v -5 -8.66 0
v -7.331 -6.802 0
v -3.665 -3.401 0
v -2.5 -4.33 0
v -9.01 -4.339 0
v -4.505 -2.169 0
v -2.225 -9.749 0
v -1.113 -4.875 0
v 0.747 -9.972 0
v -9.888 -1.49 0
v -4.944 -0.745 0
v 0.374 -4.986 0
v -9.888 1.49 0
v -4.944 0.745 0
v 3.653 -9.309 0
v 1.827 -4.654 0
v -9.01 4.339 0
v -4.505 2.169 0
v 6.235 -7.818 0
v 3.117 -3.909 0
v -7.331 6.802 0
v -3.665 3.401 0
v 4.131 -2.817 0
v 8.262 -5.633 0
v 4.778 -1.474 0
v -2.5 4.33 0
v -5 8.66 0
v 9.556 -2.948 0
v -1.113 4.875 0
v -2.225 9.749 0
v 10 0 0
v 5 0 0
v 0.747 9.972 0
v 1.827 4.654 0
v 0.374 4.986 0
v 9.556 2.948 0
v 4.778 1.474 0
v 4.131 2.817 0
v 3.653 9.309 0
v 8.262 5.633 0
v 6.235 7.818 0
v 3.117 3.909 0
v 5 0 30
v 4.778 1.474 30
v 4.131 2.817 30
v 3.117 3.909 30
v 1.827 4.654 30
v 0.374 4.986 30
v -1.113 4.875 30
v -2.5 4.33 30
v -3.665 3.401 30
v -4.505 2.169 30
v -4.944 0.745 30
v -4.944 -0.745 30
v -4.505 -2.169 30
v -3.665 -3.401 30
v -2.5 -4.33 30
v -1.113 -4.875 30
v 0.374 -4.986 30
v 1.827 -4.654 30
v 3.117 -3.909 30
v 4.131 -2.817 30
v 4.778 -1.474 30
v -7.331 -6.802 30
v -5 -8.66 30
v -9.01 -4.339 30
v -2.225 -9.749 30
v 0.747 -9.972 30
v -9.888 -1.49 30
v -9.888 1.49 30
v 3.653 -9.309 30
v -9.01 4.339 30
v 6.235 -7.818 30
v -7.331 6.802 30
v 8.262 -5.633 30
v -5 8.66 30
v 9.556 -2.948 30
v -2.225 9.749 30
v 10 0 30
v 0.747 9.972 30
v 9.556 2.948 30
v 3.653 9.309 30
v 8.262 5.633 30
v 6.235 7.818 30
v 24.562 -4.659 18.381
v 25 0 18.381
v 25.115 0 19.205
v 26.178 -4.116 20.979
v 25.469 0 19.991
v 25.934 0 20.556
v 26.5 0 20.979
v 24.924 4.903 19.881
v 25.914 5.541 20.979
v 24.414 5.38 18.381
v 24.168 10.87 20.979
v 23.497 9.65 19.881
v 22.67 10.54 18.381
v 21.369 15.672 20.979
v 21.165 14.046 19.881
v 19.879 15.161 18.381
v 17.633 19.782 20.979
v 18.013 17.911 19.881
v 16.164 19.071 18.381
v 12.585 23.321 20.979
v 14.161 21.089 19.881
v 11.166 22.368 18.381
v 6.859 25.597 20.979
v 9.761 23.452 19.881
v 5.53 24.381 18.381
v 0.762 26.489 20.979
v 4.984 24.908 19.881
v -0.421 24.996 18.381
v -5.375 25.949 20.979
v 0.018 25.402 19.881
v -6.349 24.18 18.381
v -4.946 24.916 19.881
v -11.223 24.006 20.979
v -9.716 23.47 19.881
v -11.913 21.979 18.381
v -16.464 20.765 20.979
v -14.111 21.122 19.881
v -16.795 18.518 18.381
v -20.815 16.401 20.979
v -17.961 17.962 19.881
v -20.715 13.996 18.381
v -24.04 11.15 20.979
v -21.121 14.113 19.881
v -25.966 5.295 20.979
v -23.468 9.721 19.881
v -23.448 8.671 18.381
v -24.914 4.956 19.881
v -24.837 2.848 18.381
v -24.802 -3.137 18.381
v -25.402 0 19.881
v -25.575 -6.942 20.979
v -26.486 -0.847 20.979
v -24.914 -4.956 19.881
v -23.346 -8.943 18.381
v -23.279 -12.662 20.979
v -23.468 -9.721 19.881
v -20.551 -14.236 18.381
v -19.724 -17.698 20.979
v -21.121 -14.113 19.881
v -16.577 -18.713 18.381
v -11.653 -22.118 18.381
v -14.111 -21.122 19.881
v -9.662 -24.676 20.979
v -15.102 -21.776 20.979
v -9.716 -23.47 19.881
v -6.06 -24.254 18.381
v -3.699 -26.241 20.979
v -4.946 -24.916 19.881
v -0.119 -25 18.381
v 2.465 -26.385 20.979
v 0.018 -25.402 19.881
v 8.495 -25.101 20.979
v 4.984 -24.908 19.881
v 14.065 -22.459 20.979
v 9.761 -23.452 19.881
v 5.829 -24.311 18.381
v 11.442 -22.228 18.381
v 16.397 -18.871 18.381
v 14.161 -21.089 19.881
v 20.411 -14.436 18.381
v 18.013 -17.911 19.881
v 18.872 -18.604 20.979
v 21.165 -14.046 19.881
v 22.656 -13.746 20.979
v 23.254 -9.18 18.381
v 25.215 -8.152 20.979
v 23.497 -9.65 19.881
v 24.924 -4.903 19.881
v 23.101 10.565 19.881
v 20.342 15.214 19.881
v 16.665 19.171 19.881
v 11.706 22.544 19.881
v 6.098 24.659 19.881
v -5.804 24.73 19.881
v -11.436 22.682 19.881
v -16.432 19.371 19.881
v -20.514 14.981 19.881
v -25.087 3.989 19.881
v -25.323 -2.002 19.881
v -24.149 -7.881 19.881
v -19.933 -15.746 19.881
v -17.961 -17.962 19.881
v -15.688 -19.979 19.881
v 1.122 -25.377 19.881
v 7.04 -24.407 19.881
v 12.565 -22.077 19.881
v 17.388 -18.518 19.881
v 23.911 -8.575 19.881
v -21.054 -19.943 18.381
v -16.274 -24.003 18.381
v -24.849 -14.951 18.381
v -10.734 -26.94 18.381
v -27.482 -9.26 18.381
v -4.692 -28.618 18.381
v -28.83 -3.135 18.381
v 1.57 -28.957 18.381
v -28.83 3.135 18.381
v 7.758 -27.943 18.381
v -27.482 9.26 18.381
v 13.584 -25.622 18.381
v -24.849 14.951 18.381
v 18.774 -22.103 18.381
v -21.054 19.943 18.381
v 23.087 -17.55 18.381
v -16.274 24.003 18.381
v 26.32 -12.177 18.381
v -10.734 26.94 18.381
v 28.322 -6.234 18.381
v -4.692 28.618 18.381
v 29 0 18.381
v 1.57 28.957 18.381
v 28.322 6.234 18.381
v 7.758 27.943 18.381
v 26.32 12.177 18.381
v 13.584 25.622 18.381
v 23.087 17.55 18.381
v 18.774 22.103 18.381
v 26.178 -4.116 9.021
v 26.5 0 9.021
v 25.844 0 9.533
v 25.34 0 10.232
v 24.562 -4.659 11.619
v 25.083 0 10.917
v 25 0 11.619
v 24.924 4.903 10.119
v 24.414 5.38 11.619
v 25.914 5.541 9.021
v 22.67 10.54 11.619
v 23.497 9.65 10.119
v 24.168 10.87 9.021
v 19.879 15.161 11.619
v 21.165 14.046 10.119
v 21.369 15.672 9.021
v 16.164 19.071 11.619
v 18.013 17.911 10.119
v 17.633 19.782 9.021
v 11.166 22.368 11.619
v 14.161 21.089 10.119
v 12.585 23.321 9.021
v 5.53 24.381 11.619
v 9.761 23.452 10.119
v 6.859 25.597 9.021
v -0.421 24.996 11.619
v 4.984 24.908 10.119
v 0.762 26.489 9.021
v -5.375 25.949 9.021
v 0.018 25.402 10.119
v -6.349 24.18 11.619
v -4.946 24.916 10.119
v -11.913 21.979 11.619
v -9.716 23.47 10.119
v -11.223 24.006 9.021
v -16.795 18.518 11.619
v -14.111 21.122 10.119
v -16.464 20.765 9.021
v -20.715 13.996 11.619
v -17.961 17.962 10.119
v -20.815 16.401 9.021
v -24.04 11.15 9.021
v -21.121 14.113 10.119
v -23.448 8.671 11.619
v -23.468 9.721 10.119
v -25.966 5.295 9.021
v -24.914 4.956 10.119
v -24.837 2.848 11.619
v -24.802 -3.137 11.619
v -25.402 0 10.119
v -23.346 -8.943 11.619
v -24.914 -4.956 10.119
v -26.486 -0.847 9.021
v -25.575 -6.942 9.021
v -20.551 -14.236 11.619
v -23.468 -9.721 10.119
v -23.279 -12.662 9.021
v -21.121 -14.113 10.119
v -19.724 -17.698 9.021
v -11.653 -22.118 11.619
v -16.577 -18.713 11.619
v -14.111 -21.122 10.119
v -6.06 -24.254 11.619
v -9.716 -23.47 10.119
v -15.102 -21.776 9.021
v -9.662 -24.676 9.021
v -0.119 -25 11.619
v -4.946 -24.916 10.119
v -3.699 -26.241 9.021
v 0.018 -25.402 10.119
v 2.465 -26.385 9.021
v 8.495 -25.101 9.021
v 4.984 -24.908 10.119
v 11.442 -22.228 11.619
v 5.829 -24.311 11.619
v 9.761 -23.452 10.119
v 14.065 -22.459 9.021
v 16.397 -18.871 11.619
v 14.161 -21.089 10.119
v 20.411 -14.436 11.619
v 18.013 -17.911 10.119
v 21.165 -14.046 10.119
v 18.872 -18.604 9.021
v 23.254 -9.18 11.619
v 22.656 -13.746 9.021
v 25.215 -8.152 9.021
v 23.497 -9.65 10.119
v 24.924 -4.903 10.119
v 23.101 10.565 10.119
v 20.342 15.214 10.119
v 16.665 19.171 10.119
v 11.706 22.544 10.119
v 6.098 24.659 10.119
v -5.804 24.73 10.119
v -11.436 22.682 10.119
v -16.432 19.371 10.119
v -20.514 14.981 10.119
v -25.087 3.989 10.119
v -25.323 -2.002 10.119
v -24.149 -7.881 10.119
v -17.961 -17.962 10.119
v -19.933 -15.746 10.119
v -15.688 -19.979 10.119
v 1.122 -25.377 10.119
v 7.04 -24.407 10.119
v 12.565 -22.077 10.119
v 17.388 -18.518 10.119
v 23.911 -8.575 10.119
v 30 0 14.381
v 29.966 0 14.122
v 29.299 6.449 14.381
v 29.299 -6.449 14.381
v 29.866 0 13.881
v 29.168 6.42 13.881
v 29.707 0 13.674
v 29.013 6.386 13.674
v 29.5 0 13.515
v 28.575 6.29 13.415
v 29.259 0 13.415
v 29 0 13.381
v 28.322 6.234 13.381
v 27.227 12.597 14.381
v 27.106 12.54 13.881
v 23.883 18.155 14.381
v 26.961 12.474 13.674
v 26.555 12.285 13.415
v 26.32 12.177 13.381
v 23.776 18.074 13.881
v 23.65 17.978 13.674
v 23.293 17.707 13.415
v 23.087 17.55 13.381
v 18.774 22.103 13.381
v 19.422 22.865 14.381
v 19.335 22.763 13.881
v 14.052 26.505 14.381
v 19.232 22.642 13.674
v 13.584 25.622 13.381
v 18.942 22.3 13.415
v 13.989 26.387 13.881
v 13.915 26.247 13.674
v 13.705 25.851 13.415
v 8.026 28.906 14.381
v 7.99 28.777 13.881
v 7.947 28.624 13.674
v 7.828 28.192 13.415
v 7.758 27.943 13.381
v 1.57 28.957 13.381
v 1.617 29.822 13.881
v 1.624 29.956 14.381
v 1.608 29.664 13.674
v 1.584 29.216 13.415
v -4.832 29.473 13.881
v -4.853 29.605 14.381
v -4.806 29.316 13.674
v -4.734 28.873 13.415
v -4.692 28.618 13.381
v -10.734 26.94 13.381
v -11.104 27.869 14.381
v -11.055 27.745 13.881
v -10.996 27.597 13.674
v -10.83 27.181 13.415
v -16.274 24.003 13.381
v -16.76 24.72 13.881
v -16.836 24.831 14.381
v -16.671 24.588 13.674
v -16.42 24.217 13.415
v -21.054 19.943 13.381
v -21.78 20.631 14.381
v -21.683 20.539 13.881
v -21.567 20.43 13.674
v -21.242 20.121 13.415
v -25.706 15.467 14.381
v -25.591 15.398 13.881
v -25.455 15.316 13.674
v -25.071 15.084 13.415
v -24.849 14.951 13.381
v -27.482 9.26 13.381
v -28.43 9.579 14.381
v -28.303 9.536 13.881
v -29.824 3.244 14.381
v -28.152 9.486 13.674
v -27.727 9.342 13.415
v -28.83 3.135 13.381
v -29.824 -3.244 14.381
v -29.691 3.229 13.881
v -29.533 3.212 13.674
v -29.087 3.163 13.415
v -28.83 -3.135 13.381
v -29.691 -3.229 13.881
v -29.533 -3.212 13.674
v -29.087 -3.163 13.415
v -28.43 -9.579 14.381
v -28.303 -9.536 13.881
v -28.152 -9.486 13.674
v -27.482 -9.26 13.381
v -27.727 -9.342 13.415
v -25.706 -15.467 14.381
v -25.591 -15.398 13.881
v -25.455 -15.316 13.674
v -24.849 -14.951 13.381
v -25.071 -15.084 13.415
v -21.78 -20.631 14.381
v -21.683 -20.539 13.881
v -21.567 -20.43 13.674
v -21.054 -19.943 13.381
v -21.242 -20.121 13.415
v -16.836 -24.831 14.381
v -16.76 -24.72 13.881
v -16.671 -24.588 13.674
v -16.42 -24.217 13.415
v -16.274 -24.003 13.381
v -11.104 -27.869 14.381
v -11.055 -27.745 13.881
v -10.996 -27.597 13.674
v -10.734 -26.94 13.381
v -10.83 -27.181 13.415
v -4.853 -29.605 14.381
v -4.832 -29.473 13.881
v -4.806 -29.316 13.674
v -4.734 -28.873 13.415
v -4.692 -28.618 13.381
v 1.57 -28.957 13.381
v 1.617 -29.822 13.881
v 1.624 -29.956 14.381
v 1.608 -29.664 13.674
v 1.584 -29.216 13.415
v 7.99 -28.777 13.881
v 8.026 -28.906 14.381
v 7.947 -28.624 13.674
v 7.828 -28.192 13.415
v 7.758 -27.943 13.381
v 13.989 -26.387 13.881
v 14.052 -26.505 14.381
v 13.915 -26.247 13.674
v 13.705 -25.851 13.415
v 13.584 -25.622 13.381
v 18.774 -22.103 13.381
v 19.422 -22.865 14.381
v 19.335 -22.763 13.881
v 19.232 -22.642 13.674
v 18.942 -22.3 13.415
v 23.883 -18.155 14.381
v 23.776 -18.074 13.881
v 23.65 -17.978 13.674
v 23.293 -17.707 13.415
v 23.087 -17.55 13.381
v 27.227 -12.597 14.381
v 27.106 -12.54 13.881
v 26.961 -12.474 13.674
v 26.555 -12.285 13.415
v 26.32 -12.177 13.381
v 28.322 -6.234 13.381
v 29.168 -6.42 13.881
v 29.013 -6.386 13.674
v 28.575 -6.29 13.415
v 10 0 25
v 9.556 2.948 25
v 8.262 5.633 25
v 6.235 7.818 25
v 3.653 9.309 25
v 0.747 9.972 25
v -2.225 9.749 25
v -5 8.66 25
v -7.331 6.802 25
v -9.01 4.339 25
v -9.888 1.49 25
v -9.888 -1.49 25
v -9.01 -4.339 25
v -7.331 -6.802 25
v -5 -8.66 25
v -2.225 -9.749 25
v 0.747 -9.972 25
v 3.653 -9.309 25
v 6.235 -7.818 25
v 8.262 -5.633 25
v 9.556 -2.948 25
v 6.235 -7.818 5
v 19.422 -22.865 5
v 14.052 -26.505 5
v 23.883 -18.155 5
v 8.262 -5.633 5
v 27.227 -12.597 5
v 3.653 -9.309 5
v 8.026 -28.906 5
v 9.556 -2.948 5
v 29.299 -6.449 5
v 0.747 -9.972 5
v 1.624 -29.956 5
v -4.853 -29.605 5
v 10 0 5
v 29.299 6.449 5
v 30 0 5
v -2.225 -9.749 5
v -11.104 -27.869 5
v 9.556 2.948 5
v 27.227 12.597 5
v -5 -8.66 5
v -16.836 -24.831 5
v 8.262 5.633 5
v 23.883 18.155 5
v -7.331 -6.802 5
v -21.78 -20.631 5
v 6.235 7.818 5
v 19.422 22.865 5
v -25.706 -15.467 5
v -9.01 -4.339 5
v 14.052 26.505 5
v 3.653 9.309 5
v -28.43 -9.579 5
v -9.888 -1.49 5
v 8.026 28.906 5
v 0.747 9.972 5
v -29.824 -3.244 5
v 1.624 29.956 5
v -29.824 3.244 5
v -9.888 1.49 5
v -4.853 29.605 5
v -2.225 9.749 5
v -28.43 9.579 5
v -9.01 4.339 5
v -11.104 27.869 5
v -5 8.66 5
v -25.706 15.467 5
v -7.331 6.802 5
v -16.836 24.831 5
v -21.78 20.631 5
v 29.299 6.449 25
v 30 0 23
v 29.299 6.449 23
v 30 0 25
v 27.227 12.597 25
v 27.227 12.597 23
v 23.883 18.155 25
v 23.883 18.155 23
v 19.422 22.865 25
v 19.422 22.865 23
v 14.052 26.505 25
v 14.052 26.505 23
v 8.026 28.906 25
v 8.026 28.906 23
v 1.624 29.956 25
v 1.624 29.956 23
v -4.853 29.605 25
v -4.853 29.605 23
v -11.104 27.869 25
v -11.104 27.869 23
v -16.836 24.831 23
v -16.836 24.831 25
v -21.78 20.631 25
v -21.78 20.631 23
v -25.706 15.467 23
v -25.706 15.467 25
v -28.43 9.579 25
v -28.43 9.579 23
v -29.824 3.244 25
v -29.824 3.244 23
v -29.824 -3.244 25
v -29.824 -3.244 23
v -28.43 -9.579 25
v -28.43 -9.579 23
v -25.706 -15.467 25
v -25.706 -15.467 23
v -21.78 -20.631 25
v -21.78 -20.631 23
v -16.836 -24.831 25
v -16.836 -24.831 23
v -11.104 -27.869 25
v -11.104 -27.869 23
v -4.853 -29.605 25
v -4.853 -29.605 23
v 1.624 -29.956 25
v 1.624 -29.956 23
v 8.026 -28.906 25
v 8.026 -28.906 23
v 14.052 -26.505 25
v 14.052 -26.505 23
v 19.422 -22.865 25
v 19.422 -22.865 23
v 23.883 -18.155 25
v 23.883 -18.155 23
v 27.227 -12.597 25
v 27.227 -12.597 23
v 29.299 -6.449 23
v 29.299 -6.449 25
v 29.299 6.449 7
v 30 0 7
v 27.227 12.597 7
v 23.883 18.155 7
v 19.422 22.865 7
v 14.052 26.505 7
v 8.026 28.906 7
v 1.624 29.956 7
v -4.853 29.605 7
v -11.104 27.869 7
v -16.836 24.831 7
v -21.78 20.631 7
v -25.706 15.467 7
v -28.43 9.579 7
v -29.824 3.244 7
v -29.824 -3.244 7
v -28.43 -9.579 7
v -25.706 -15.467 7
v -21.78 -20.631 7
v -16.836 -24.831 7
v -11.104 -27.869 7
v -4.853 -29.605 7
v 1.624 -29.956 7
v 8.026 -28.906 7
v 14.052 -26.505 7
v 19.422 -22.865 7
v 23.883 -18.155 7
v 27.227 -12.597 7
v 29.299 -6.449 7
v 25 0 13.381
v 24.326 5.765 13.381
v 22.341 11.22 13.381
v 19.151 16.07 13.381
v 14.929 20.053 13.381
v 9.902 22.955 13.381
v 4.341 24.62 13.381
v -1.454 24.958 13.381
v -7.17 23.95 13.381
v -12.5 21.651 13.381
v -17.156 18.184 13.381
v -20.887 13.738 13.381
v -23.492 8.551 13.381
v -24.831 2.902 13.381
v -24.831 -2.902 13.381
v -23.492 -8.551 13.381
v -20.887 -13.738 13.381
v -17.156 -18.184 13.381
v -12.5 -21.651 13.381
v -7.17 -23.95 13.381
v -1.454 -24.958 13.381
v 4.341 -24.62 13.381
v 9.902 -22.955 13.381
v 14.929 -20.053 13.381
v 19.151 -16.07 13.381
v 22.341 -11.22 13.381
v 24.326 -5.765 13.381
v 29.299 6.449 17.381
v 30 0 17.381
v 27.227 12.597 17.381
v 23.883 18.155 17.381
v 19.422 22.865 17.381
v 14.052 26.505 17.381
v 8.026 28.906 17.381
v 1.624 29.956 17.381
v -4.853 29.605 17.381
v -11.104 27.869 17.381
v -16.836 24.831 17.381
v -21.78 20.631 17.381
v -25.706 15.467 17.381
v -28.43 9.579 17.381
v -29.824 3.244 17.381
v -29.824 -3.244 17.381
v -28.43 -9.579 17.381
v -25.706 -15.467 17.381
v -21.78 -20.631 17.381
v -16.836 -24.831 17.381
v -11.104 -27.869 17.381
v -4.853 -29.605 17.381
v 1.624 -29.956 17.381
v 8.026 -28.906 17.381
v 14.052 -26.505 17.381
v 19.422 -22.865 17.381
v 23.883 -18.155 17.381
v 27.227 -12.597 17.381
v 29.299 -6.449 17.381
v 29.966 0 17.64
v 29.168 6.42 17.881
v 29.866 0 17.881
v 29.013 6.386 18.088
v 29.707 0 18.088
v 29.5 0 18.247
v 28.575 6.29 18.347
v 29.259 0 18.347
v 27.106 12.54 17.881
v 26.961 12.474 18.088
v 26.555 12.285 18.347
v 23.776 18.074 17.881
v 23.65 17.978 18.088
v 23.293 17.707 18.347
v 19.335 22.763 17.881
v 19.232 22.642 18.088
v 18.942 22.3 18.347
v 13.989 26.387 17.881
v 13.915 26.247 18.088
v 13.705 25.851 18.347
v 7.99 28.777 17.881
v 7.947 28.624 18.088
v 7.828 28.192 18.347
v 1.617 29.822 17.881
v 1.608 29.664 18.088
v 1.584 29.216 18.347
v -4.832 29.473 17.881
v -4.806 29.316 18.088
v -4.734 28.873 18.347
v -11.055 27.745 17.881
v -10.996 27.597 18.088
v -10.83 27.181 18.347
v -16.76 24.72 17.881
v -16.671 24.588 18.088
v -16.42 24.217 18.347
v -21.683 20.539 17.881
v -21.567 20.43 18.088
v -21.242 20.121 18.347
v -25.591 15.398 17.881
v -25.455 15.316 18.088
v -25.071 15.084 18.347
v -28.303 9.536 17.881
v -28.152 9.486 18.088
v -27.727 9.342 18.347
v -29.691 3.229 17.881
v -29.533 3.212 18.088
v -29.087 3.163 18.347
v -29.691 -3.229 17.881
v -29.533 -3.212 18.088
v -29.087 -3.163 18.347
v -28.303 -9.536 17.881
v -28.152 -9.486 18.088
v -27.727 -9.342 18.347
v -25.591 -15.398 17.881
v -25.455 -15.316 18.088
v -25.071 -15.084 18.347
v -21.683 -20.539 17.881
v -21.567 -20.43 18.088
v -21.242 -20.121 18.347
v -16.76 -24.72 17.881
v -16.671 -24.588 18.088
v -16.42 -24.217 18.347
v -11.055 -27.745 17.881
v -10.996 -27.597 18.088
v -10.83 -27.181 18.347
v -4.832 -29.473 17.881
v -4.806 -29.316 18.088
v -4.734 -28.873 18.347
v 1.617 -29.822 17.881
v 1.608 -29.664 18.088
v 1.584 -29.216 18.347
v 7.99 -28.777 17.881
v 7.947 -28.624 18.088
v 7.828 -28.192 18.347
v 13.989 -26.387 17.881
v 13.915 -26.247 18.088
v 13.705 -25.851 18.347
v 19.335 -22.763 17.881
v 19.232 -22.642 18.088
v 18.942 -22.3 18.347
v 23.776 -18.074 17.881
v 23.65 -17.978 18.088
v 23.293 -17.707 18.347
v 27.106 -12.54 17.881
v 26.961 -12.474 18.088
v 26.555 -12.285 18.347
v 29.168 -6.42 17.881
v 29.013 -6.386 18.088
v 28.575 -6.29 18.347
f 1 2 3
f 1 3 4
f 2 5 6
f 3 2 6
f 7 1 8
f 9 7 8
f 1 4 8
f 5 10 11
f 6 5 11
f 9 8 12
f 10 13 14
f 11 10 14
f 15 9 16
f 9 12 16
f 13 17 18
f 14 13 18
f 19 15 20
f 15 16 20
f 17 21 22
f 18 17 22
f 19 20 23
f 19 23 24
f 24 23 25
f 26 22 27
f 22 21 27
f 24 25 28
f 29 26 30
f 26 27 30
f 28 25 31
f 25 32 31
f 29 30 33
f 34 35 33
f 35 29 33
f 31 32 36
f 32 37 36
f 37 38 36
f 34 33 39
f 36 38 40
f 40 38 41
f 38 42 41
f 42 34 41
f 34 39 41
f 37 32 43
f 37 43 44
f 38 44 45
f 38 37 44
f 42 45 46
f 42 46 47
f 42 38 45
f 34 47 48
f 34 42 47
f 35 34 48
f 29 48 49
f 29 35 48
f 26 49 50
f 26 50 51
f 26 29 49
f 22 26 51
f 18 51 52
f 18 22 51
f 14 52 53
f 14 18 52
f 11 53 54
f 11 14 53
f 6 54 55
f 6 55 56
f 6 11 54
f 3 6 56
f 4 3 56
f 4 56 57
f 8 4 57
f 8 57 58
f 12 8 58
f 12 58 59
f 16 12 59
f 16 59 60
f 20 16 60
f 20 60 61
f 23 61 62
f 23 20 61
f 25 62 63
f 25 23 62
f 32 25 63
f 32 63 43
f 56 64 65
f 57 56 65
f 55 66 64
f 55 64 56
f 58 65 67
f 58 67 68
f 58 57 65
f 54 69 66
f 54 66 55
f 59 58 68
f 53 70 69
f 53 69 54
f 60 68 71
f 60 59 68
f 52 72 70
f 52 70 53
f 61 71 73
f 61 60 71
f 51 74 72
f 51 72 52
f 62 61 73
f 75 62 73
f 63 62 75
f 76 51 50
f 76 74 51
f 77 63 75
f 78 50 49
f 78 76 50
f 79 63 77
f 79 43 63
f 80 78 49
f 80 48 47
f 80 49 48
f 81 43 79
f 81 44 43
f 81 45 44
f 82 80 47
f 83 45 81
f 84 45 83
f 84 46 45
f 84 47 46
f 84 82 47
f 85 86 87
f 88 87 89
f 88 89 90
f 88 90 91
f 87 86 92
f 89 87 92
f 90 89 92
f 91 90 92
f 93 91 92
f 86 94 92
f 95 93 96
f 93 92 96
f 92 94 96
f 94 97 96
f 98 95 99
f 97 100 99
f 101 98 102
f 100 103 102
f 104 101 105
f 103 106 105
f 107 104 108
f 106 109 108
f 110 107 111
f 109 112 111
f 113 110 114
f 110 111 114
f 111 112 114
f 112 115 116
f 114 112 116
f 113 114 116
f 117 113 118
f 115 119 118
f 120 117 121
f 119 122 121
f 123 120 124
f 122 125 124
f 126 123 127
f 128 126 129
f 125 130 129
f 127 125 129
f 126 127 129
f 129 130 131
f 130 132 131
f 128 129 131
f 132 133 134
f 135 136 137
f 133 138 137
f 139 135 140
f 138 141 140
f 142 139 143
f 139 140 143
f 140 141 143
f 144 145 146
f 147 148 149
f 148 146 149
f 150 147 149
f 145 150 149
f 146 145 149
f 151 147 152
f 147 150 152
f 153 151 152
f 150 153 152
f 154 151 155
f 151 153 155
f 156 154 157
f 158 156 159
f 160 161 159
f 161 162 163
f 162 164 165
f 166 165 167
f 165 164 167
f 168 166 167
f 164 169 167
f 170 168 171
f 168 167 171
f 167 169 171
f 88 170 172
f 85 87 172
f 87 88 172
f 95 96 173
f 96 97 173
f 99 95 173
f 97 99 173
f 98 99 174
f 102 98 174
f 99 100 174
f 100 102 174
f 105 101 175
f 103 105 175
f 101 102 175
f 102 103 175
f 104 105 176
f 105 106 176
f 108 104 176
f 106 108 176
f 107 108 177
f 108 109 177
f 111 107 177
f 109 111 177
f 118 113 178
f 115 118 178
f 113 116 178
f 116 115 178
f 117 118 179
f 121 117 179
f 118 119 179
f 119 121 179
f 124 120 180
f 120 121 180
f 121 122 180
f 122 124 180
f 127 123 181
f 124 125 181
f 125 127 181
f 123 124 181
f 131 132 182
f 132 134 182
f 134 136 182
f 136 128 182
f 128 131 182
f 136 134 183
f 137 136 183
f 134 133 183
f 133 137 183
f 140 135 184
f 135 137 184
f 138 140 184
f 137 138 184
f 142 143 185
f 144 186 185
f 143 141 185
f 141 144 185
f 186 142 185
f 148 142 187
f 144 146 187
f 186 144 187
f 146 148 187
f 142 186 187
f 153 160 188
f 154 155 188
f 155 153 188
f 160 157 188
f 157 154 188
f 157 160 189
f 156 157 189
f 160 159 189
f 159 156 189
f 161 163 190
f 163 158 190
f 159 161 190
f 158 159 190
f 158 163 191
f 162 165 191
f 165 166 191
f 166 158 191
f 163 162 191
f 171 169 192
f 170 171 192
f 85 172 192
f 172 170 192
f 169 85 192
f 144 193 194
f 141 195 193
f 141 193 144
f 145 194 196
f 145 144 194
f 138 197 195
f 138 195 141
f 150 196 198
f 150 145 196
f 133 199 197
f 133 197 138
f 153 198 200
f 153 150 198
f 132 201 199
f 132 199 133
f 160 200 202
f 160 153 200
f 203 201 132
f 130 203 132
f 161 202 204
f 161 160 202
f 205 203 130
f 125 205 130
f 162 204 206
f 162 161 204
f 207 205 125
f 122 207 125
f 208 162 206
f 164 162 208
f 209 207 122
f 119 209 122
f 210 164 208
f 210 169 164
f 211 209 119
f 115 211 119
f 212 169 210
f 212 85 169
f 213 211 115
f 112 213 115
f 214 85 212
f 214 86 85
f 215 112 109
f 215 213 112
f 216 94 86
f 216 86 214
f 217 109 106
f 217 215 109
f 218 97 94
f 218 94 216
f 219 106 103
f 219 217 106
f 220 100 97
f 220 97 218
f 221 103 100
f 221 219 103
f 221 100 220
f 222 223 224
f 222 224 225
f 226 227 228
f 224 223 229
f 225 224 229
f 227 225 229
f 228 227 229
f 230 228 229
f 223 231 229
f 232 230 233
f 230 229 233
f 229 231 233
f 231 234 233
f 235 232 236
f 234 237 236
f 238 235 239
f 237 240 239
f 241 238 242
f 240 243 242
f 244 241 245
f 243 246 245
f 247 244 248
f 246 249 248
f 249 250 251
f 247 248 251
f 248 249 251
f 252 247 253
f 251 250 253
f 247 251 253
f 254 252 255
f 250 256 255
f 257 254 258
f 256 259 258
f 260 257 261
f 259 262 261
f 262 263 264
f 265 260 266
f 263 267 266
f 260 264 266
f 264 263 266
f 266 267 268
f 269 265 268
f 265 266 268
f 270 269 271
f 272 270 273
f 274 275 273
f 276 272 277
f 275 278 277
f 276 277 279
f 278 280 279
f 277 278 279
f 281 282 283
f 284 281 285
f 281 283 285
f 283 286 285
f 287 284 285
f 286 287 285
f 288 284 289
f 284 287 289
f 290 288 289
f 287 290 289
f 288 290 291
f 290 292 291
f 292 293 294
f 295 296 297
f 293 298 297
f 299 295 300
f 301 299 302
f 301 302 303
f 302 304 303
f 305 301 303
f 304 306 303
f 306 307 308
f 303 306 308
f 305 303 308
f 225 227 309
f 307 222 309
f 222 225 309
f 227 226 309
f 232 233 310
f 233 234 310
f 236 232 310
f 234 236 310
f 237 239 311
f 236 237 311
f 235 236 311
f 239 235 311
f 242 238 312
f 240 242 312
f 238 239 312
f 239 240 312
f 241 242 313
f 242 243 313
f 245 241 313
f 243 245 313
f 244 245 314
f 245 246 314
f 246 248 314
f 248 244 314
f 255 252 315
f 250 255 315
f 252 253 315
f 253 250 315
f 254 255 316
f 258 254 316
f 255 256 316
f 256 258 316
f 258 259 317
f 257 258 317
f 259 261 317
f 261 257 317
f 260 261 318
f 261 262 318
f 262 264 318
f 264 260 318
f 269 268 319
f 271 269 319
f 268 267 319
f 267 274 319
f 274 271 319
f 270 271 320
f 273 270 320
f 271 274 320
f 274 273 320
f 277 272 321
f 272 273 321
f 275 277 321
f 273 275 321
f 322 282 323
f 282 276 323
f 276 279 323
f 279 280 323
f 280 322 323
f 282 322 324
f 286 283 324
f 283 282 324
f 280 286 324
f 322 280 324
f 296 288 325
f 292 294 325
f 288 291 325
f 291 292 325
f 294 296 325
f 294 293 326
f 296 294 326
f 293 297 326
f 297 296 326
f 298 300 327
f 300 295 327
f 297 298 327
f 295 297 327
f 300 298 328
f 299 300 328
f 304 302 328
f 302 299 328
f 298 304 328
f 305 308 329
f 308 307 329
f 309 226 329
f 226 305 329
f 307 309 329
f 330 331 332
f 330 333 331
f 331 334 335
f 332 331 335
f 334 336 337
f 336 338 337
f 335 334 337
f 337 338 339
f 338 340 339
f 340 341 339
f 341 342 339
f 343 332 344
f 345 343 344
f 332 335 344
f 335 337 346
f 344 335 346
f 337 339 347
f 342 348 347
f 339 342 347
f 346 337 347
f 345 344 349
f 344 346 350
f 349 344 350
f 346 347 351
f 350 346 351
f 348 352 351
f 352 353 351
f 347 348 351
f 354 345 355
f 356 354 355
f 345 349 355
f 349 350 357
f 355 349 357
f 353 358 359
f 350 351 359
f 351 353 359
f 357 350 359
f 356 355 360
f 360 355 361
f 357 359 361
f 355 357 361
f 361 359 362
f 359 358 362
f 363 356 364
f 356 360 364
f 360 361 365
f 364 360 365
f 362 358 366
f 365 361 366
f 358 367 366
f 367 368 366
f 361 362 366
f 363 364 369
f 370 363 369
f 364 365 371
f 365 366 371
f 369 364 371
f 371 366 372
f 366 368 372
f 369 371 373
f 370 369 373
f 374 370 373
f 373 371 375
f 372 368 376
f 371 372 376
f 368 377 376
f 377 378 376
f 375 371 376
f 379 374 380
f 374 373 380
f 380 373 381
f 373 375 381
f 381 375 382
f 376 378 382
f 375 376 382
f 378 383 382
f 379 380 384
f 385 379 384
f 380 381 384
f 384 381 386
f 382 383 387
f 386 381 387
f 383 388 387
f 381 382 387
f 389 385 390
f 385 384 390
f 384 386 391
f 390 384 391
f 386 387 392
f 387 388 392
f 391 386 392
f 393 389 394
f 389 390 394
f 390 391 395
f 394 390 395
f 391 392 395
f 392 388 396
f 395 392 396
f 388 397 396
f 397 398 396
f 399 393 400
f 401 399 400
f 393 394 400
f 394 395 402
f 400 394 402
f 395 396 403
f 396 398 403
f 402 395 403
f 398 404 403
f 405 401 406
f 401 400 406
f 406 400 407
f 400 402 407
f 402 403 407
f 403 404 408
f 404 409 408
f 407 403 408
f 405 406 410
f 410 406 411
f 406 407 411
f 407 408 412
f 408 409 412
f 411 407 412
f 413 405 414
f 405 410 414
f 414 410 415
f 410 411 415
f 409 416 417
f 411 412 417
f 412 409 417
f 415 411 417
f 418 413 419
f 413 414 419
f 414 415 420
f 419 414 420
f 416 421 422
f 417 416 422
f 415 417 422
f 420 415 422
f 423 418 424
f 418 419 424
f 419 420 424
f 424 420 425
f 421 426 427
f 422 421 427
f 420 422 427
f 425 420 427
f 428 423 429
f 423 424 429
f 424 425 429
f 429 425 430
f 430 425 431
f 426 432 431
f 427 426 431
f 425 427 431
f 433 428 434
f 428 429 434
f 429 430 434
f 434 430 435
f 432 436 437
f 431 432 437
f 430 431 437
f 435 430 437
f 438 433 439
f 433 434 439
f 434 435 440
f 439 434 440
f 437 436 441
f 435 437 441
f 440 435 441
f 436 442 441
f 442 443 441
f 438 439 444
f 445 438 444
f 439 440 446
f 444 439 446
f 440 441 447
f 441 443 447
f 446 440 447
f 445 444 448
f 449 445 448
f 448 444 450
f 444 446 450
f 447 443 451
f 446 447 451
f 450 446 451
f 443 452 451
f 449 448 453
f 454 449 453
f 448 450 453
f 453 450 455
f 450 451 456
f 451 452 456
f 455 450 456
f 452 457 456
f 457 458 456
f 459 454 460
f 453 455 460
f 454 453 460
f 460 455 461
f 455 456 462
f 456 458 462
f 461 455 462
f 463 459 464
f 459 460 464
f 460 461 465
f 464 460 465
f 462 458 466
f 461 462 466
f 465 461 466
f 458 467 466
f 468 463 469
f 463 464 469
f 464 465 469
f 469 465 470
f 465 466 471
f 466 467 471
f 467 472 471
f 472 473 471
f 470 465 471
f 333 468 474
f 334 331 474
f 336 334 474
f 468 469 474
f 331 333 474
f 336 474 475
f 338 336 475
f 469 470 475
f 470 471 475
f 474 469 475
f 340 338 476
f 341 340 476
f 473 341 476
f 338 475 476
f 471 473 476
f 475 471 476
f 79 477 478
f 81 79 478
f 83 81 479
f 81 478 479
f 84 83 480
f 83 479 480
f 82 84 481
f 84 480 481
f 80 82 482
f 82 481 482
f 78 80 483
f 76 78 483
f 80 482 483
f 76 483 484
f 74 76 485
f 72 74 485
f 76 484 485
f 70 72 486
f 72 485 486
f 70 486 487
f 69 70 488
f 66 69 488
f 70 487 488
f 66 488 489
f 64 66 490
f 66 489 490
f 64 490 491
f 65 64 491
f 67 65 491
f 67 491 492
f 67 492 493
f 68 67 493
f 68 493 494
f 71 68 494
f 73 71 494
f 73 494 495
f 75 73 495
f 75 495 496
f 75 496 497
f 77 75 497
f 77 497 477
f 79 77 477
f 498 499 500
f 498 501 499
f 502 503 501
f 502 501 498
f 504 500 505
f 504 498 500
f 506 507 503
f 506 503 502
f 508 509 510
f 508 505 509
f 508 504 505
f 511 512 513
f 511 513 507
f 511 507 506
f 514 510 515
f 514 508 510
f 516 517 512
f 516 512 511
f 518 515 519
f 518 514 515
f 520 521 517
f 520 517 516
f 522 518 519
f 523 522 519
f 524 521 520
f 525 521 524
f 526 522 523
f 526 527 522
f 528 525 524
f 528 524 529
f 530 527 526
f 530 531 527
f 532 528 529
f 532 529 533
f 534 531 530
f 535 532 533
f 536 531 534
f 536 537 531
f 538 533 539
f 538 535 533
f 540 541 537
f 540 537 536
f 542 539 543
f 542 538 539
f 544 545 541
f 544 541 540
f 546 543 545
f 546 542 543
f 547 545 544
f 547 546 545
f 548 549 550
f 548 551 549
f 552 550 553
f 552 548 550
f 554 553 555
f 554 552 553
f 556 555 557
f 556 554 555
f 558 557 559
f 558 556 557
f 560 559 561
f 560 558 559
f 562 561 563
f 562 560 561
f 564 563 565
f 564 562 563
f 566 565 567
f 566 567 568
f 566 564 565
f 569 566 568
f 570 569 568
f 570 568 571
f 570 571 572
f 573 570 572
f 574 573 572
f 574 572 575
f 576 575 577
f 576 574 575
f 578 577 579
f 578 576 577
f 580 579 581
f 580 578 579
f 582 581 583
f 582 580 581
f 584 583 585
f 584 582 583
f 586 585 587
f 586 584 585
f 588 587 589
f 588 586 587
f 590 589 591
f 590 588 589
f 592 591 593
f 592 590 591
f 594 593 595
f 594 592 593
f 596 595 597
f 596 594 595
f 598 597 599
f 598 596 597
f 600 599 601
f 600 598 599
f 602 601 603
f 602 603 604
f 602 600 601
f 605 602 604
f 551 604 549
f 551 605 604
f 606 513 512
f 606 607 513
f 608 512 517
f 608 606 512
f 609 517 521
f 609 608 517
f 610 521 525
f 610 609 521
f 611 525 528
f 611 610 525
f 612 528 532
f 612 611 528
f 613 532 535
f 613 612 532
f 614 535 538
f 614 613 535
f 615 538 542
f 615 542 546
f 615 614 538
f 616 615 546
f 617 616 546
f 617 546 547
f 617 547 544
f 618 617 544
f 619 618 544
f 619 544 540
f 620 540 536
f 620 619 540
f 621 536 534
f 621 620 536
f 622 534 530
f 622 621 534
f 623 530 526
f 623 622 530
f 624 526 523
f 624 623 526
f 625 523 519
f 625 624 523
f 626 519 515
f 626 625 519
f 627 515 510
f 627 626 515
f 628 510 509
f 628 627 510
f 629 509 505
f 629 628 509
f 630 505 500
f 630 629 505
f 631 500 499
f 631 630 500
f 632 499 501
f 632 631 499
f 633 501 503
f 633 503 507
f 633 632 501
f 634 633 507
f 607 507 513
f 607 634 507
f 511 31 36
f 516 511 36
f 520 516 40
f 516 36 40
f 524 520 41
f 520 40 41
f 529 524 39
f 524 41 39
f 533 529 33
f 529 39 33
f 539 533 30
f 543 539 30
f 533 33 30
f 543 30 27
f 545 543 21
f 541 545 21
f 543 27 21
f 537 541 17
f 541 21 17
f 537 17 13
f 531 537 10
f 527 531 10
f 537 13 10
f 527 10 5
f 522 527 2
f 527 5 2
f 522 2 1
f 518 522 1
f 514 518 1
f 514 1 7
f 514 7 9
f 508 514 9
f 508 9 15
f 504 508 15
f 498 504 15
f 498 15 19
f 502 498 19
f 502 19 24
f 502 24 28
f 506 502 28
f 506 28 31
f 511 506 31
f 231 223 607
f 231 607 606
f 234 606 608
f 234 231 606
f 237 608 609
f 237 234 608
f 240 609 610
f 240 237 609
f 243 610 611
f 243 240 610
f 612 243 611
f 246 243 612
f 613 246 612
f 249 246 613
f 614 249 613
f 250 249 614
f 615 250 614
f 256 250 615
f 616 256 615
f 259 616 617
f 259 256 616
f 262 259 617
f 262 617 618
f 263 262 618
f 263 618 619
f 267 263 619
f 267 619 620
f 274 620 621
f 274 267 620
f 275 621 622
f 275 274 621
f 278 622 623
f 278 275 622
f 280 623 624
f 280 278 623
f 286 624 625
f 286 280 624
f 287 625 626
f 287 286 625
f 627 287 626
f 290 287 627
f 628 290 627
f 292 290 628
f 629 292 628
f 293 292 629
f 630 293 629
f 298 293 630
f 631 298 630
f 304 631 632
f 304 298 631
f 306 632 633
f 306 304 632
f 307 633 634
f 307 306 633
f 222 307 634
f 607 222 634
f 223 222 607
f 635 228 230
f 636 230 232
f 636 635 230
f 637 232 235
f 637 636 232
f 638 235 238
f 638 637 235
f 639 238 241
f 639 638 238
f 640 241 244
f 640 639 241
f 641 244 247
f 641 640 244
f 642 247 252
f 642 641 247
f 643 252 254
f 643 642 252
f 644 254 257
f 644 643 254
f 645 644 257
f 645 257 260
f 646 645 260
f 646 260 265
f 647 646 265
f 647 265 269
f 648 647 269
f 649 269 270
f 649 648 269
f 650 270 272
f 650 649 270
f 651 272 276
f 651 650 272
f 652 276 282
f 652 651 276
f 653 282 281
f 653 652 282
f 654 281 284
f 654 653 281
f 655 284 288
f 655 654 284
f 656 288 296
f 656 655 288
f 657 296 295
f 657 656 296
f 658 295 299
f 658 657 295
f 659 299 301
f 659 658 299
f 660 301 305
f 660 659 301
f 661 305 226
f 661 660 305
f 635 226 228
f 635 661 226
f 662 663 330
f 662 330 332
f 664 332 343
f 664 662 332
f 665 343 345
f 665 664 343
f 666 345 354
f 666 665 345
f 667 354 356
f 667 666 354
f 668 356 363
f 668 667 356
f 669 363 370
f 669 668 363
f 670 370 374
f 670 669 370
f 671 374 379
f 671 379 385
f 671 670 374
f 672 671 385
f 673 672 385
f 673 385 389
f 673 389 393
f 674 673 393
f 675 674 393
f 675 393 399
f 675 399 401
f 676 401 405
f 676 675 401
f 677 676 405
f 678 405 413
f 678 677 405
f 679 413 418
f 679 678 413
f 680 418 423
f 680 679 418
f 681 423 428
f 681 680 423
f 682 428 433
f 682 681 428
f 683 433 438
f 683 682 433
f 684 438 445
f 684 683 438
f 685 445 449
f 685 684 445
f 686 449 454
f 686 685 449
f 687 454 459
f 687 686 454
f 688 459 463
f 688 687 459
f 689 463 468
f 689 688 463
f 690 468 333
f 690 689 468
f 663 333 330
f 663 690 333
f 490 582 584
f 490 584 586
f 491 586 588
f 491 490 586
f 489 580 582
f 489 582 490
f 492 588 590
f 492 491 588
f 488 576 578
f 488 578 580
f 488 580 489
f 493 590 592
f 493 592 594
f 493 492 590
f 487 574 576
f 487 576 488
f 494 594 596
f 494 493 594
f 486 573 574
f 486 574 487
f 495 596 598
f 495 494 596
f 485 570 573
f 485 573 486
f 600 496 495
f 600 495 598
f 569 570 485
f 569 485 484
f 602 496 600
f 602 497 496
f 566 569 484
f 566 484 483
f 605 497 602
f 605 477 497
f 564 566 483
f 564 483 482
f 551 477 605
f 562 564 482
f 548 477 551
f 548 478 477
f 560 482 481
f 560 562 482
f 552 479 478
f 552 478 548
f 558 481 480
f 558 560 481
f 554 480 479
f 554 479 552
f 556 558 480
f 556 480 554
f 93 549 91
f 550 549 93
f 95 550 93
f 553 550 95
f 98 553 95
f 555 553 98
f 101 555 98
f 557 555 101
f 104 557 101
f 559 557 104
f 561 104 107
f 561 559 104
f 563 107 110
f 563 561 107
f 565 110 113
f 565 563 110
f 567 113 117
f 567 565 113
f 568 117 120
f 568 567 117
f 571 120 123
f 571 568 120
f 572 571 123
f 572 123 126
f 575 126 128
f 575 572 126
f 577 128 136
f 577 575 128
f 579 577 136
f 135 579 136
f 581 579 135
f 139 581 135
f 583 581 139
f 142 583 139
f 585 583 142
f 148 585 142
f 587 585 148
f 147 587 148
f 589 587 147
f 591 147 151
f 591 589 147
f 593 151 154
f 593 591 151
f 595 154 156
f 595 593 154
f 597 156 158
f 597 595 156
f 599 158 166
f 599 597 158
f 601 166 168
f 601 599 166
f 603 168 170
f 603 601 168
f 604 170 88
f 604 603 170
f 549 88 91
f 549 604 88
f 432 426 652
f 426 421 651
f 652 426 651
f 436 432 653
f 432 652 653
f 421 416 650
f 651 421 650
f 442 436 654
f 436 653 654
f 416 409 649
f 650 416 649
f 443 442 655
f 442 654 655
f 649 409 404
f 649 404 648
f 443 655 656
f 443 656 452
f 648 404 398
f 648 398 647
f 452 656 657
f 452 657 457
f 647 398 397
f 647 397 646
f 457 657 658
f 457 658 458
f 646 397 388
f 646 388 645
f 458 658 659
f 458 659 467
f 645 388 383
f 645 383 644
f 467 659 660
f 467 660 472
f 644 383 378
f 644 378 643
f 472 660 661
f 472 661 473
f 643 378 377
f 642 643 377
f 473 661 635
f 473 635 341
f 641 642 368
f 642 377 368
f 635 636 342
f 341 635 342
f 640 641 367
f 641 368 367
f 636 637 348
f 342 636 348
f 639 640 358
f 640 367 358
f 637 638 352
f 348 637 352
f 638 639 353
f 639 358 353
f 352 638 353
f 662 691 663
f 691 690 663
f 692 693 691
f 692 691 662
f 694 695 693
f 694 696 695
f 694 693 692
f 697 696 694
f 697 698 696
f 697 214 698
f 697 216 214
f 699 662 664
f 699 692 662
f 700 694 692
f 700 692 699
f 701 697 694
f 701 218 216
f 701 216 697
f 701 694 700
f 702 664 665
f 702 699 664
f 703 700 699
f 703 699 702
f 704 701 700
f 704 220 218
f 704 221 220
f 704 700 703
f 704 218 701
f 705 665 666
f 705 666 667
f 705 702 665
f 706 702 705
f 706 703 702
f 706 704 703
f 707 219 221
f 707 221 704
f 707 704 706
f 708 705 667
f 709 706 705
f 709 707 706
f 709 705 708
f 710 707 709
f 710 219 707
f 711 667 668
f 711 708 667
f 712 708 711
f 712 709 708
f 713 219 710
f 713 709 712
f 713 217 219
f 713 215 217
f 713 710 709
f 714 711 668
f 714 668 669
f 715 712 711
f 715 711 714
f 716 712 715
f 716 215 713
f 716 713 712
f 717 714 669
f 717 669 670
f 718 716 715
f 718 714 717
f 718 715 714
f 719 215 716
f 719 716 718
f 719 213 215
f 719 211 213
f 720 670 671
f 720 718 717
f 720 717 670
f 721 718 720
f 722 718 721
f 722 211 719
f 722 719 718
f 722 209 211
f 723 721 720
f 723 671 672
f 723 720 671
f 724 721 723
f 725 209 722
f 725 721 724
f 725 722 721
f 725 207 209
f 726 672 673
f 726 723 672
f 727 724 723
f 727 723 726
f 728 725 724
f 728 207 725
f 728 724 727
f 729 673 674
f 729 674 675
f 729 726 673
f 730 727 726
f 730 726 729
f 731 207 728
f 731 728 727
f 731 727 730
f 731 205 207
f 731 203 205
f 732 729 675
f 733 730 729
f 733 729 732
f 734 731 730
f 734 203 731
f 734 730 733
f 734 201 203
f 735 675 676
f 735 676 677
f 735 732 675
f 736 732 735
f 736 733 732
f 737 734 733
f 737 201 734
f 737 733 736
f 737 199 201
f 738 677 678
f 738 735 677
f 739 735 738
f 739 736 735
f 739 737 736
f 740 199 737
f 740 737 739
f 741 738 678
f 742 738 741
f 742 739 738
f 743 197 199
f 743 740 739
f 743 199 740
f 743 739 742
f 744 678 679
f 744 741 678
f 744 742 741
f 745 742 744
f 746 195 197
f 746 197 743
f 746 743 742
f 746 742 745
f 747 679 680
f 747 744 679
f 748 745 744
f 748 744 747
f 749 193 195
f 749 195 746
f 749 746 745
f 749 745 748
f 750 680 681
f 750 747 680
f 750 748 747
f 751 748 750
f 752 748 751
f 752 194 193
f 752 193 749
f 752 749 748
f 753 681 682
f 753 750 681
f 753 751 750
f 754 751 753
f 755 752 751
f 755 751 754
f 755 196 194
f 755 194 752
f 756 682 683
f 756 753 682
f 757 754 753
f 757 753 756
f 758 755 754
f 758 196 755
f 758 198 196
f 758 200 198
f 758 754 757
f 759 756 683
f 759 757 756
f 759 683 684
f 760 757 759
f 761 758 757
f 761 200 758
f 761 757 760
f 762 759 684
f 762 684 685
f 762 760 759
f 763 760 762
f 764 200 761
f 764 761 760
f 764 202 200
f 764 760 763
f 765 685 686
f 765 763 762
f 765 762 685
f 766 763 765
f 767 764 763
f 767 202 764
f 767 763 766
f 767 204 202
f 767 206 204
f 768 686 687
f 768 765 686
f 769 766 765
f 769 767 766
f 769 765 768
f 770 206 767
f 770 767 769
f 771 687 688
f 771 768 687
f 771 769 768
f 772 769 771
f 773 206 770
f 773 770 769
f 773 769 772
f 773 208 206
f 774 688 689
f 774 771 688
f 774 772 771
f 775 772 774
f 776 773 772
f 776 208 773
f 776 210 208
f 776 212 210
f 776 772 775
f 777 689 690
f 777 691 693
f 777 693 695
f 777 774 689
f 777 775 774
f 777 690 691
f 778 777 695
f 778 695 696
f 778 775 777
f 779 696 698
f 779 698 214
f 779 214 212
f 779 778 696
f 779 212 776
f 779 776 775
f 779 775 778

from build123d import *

# Parameters (mm, degrees)
SKETCH1_R           = 10
SKETCH1_R_2         = 5
BOSS_EXTRUDE1_DEPTH = 30
FILLET1_R           = 3
BOSS_EXTRUDE2_START = -5
SKETCH5_R           = 30
SKETCH5_R_2         = 25
BOSS_EXTRUDE2_DEPTH = 5
FILLET2_R           = 1


with BuildPart() as part:
    # Sketch1 → Boss-Extrude1 (new body)
    with BuildSketch(Plane.XY):
        Circle(SKETCH1_R)
        Circle(SKETCH1_R_2, mode=Mode.SUBTRACT)
    extrude(amount=BOSS_EXTRUDE1_DEPTH)

    # Sketch4 → Revolve1 (revolve)
    with BuildSketch(Plane(origin=(0, 0, 0), x_dir=(1, 0, 0), z_dir=(0, 1, 0))):
        Polygon((30, -5), (10, -5), (10, -25), (30, -25), (30, -23), (25, -20.113248654), (25, -9.886751346), (30, -7), align=None)
    revolve(axis=Axis((0, 0, 0), (0, 0, 1)))

    # Fillet1
    fillet1_edges = [part.edges().sort_by_distance(p)[0] for p in [
        (-25, 0, 20.113248654),
        (-25, 0, 9.886751346),
    ]]
    fillet(fillet1_edges, radius=FILLET1_R)

    # Sketch5 → Boss-Extrude2 (add)
    with BuildSketch(Plane.XY.offset(18.381197846).offset(BOSS_EXTRUDE2_START)):
        Circle(SKETCH5_R)
        Circle(SKETCH5_R_2, mode=Mode.SUBTRACT)
    extrude(amount=BOSS_EXTRUDE2_DEPTH)

    # Fillet2
    fillet2_edges = [part.edges().sort_by_distance(p)[0] for p in [
        (-30, 0, 18.381197846),
        (-30, 0, 13.381197846),
    ]]
    fillet(fillet2_edges, radius=FILLET2_R)


solid = part.part
